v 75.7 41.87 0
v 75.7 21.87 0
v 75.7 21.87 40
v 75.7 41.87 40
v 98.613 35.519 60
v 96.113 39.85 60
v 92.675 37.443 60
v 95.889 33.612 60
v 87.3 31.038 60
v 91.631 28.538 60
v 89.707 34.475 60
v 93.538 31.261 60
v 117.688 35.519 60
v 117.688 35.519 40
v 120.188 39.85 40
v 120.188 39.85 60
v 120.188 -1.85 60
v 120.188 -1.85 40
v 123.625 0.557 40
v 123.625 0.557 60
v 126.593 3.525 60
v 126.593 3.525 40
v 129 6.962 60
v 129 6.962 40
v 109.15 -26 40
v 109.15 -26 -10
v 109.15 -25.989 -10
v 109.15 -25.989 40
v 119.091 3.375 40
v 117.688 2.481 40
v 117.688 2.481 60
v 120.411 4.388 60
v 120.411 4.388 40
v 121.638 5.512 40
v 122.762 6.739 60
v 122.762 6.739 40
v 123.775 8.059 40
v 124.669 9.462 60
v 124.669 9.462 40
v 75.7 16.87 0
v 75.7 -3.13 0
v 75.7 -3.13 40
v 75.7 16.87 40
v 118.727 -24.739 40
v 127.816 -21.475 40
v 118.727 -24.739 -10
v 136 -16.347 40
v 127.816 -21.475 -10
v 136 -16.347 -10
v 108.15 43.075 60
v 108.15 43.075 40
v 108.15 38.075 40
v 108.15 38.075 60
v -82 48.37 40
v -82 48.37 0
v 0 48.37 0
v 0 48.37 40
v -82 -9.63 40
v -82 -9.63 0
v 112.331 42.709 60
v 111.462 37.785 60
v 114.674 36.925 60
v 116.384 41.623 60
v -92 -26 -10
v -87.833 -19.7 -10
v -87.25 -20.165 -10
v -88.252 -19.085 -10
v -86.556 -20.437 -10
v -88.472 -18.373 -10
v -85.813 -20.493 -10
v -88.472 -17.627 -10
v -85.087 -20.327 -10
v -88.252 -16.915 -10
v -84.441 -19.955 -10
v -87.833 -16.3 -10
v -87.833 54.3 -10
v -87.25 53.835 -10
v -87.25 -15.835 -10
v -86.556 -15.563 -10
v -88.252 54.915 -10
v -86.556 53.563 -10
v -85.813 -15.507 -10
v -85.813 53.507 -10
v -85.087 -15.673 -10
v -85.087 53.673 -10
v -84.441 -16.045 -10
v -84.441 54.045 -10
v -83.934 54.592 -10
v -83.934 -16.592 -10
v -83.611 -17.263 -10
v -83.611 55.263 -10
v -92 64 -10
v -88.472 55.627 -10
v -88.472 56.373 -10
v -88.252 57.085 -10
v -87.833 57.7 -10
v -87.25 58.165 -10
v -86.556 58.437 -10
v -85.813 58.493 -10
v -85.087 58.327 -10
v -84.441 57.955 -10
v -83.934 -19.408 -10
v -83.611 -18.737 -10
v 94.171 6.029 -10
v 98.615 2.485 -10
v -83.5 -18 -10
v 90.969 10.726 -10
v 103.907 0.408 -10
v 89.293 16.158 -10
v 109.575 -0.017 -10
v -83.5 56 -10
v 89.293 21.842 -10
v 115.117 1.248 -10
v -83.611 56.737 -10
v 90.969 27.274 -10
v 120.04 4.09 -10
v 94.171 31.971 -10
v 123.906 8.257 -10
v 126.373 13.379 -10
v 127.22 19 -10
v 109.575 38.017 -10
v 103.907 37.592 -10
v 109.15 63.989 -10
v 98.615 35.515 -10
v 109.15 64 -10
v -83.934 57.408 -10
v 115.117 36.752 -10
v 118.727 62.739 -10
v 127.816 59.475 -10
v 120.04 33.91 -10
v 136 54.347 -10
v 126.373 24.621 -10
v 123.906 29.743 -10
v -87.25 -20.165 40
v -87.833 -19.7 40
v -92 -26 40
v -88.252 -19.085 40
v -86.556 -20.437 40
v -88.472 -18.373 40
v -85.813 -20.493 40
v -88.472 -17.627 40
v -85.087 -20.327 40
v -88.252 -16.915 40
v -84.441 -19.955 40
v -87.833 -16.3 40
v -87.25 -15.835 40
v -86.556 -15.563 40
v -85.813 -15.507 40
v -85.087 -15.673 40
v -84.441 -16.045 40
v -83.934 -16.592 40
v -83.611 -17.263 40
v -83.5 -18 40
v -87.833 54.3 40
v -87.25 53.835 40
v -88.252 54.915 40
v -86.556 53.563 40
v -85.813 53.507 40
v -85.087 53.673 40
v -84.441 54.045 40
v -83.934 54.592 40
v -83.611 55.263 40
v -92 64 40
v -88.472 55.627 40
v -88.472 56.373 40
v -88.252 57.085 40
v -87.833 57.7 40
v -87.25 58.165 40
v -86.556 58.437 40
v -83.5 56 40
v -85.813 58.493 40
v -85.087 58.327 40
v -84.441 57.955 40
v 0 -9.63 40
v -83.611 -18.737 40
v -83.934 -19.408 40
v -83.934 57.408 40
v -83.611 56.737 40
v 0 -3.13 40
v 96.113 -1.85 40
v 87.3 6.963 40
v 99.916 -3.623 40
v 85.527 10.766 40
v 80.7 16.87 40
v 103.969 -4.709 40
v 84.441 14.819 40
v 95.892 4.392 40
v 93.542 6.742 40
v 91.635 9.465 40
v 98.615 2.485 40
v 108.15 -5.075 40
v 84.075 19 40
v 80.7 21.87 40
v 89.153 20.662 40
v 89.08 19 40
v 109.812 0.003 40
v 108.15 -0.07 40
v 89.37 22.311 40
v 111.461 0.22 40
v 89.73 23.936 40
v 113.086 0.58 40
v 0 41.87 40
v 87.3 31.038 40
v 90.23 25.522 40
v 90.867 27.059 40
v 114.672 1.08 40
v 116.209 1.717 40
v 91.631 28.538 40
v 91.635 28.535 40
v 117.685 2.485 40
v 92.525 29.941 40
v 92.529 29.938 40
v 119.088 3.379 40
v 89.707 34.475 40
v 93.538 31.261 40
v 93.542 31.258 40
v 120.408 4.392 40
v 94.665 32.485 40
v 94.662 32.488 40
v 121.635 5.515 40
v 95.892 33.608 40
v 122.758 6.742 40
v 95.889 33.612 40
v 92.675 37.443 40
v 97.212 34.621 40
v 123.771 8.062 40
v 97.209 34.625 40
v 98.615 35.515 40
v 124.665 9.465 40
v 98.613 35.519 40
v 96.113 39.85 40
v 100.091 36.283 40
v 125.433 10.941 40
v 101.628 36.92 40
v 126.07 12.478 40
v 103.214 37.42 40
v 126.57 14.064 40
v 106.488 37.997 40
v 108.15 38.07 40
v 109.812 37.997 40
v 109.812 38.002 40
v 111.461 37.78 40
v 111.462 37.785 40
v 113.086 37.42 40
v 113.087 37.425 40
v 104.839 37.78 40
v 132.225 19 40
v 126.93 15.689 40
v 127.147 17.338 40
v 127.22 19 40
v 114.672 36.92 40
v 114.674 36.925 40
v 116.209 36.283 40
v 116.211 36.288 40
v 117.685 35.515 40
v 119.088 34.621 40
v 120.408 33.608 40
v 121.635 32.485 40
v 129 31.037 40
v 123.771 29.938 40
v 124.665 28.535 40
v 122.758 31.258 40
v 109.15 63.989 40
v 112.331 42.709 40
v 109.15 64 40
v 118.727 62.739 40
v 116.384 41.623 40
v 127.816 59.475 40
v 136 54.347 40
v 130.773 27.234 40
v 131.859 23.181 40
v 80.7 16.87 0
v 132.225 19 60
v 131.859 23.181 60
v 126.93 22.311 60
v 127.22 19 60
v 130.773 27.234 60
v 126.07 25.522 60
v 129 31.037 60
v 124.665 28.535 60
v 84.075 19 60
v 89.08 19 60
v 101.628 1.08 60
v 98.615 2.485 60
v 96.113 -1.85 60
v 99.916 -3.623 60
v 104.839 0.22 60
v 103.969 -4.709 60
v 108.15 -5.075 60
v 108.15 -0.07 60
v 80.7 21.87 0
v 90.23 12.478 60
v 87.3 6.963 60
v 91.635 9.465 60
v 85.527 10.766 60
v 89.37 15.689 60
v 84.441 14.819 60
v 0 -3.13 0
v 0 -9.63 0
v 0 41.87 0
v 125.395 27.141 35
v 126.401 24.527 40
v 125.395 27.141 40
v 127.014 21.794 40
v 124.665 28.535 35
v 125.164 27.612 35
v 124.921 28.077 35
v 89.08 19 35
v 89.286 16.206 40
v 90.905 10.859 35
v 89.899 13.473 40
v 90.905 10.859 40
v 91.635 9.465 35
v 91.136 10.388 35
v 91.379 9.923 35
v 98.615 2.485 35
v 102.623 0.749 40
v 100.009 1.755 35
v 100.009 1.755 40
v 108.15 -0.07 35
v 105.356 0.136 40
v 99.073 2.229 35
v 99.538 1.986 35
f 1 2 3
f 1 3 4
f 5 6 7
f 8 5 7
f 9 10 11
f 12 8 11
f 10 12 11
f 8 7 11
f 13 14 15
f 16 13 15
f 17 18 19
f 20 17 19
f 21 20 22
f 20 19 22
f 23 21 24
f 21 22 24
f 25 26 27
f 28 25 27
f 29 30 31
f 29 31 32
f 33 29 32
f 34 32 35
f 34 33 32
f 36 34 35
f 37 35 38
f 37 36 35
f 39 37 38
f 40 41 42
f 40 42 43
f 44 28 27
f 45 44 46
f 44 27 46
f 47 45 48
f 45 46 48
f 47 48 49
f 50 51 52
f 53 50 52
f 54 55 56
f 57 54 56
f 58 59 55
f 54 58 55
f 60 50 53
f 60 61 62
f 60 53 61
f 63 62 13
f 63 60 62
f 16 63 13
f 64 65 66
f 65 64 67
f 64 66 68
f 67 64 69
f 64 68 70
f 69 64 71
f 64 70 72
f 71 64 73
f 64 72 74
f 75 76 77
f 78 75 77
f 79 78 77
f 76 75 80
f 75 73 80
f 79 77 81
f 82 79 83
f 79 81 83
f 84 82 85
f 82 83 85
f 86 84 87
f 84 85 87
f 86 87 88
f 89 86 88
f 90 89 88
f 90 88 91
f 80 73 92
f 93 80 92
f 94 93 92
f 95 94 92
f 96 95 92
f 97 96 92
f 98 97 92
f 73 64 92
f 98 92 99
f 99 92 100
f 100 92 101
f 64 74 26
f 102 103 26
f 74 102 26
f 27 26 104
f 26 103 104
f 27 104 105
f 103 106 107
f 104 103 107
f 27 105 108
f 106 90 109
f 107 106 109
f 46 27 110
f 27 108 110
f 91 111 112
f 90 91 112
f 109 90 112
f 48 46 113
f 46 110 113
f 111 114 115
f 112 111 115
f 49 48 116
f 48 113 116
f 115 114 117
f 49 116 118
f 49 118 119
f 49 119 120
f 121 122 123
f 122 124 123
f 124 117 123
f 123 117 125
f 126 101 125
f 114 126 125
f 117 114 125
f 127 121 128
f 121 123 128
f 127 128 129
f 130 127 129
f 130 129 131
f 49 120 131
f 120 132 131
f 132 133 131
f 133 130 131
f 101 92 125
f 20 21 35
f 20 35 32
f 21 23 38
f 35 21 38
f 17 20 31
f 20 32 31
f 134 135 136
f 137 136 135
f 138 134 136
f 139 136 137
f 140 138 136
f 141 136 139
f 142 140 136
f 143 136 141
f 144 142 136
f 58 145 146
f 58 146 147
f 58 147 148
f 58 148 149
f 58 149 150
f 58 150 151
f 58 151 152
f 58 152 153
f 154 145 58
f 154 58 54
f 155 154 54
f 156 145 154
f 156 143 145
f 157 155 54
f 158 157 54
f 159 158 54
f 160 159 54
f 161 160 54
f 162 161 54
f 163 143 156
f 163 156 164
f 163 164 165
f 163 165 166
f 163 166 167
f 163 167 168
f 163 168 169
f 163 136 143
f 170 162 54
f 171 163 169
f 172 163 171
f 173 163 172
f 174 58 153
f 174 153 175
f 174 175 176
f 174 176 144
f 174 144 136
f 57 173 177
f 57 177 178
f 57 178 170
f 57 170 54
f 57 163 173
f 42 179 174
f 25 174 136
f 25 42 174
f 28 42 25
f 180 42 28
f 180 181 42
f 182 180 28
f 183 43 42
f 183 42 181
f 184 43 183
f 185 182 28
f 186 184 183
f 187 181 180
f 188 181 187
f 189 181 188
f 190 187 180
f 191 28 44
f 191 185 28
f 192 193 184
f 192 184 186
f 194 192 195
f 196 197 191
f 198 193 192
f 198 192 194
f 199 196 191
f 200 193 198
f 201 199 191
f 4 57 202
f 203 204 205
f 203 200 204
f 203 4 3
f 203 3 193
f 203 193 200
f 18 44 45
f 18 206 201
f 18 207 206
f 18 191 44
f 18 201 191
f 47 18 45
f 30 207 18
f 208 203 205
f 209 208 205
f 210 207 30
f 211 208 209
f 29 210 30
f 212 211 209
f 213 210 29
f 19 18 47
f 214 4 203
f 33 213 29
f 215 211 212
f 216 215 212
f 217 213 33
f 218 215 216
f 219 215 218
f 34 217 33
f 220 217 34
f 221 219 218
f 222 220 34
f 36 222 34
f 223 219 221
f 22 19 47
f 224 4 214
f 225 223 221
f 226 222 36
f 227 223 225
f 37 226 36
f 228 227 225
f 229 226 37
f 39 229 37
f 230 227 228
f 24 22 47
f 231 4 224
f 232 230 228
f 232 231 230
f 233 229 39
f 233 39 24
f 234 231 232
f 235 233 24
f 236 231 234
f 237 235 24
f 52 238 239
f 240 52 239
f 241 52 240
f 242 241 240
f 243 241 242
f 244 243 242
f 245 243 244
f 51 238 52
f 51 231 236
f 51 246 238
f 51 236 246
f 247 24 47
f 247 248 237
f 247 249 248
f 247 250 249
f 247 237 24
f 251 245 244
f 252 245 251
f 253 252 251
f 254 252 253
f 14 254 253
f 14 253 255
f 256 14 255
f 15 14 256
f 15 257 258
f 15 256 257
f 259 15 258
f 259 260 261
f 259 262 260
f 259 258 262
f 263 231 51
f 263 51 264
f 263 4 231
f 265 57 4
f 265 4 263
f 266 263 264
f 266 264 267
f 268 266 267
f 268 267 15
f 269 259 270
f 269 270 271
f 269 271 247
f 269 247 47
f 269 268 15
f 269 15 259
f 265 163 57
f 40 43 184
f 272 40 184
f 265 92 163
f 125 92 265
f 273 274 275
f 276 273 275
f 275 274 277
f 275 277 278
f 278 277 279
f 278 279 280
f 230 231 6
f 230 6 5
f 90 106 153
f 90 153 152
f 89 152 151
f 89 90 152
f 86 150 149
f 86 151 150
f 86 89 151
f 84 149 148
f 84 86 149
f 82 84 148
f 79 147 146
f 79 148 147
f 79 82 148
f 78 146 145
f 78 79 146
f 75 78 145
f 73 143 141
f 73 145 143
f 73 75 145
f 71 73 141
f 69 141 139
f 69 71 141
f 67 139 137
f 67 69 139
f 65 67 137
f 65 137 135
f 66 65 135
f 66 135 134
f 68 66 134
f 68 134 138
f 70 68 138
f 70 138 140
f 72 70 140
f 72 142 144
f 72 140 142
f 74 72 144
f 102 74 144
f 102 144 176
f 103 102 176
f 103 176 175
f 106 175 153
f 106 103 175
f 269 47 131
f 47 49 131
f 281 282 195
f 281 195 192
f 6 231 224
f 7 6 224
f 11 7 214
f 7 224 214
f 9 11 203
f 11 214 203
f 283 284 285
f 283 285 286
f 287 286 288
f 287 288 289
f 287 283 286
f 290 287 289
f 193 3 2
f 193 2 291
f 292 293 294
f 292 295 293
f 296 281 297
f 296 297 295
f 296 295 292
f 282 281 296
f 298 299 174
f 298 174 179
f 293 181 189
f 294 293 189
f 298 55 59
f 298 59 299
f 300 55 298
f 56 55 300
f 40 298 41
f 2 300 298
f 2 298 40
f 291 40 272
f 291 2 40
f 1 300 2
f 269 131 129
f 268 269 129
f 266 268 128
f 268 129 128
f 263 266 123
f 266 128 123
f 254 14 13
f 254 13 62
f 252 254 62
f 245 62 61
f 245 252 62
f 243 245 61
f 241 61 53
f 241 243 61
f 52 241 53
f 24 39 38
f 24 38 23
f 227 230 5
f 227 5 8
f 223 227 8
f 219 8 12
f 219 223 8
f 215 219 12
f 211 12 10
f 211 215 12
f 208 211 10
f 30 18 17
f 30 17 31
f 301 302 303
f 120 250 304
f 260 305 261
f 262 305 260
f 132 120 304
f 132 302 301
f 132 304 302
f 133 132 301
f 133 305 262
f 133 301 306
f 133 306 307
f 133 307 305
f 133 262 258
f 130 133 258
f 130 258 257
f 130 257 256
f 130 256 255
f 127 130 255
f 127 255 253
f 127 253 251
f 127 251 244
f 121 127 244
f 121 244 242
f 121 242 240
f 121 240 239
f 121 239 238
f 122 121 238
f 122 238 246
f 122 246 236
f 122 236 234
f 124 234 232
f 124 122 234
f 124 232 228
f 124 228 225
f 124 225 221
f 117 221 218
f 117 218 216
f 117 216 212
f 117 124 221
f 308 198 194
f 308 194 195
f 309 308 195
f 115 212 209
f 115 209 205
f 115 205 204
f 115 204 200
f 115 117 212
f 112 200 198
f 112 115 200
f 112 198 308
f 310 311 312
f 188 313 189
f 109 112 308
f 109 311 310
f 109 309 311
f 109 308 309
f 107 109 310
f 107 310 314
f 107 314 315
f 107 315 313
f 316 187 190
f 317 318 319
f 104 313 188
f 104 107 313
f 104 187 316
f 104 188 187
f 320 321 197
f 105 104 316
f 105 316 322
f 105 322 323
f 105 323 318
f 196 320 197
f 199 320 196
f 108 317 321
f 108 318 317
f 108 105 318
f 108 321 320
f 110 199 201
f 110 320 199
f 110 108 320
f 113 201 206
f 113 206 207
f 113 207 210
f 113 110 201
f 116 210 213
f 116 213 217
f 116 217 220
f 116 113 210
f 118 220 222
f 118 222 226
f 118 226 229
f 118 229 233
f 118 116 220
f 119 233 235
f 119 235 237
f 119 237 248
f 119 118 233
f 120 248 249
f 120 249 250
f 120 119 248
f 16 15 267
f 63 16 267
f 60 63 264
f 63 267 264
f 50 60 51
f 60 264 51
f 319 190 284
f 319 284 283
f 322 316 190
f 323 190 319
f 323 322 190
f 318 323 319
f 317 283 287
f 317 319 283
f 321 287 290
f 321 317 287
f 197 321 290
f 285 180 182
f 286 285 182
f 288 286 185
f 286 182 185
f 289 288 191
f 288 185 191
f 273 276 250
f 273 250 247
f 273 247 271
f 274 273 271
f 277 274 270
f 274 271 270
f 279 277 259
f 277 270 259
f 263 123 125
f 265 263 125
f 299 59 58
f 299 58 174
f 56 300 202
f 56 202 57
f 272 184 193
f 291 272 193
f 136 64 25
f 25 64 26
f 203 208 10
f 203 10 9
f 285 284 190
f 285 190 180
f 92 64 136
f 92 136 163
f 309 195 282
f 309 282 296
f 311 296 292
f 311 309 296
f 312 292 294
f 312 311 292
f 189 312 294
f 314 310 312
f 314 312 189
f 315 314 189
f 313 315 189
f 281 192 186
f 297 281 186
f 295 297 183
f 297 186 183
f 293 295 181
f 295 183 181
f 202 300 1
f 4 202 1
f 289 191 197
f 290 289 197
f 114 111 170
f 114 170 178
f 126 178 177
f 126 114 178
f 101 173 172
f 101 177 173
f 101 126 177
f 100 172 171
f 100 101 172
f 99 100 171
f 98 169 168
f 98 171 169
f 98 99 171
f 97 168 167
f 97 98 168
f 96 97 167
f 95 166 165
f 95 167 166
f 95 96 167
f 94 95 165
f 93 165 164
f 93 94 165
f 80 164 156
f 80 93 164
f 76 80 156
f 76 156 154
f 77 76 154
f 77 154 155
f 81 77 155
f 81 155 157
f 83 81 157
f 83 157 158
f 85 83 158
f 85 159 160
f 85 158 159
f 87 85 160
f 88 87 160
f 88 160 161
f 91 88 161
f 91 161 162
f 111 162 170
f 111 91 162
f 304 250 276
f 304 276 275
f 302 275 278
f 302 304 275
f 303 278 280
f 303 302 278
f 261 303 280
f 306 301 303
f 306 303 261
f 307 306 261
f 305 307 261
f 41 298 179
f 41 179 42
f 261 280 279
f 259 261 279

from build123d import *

# Parameters (mm, degrees)
CYLINDER_R        = 2.5
CYLINDER_DEPTH    = 70
CYLINDER001_R     = 2.5
CYLINDER001_DEPTH = 70
BOX004_W          = 68.15
BOX004_H          = 15
BOX004_DEPTH      = 50
BOX008_W          = 30
BOX008_H          = 100
BOX008_DEPTH      = 70
EXTRUDE003_DEPTH  = 25
BOX006_W          = 40
BOX006_H          = 120
BOX006_DEPTH      = 60
TUBE_R            = 45
TUBE_R_2          = 19.07
TUBE_DEPTH        = 50
BOX001_W          = 82
BOX001_H          = 58
BOX001_DEPTH      = 44.4
BOX007_W          = 5
BOX007_H          = 5
BOX007_DEPTH      = 44.4
SKETCH001_R       = 5
EXTRUDE001_DEPTH  = 4
EXTRUDE002_DEPTH  = 15
SKETCH_R          = 12.3
EXTRUDE_DEPTH     = 5
BOX_W             = 75.7
BOX_H             = 45
BOX_DEPTH         = 44.4
BOX002_W          = 175
BOX002_H          = 90
BOX002_DEPTH      = 50
BOX005_W          = 68.15
BOX005_H          = 15
BOX005_DEPTH      = 50


with BuildPart() as throughholecylinder2:
    # Cylinder → Cylinder (new body)
    with BuildSketch(Plane(origin=(-86, -18, -20), x_dir=(1, 0, 0), z_dir=(0, 0, 1))):
        Circle(CYLINDER_R)
    extrude(amount=CYLINDER_DEPTH)


with BuildPart() as throughholecylinder1:
    # Cylinder001 → Cylinder001 (new body)
    with BuildSketch(Plane(origin=(-86, 56, -20), x_dir=(1, 0, 0), z_dir=(0, 0, 1))):
        Circle(CYLINDER001_R)
    extrude(amount=CYLINDER001_DEPTH)


with BuildPart() as cube004:
    # Box004 → Box004 (new body)
    with BuildSketch(Plane(origin=(41, -26, -10), x_dir=(1, 0, 0), z_dir=(0, 0, 1))):
        with Locations((34.075, 7.5)):
            Rectangle(BOX004_W, BOX004_H)
    extrude(amount=BOX004_DEPTH)


with BuildPart() as steeringshaftcutter:
    # Box008 → Box008 (new body)
    with BuildSketch(Plane(origin=(136, -31, -14), x_dir=(1, 0, 0), z_dir=(0, 0, 1))):
        with Locations((15, 50)):
            Rectangle(BOX008_W, BOX008_H)
    extrude(amount=BOX008_DEPTH)


with BuildPart() as fingers:
    # Sketch004 (on Face2 of Tube) → Extrude003 (new body)
    with BuildSketch(Plane(origin=(120.15, 19, 40), x_dir=(1, 0, 0), z_dir=(0, 0, 1))):
        with BuildLine():
            Line((16.519435, -9.5375), (20.849562, -12.0375))
            ThreePointArc((12.0375, -20.849562), (17.023596, -17.023596), (20.849562, -12.0375))
            Line((12.0375, -20.849562), (9.5375, -16.519435))
            ThreePointArc((9.5375, -16.519435), (13.488062, -13.488062), (16.519435, -9.5375))
        make_face()
        with BuildLine():
            Line((0, -24.075), (0, -19.07))
            ThreePointArc((-9.535, -16.515104), (-4.935679, -18.420206), (0, -19.07))
            Line((-9.535, -16.515104), (-12.0375, -20.849562))
            ThreePointArc((-12.0375, -20.849562), (-6.231069, -23.254664), (0, -24.075))
        make_face()
        with BuildLine():
            Line((-20.849562, -12.0375), (-16.515104, -9.535))
            ThreePointArc((-19.07, 0), (-18.420206, -4.935679), (-16.515104, -9.535))
            Line((-19.07, 0), (-24.075, 0))
            ThreePointArc((-24.075, 0), (-23.254664, -6.231069), (-20.849562, -12.0375))
        make_face()
        with BuildLine():
            Line((-16.519435, 9.5375), (-20.849562, 12.0375))
            ThreePointArc((-12.0375, 20.849562), (-17.023596, 17.023596), (-20.849562, 12.0375))
            Line((-12.0375, 20.849562), (-9.5375, 16.519435))
            ThreePointArc((-9.5375, 16.519435), (-13.488062, 13.488062), (-16.519435, 9.5375))
        make_face()
        with BuildLine():
            Line((0, 24.075), (0, 19.075))
            ThreePointArc((9.5375, 16.519435), (4.936973, 18.425035), (0, 19.075))
            Line((9.5375, 16.519435), (12.0375, 20.849562))
            ThreePointArc((12.0375, 20.849562), (6.231069, 23.254664), (0, 24.075))
        make_face()
        with BuildLine():
            Line((16.515104, 9.535), (20.849562, 12.0375))
            ThreePointArc((24.075, 0), (23.254664, 6.231069), (20.849562, 12.0375))
            Line((19.07, 0), (24.075, 0))
            ThreePointArc((19.07, 0), (18.420206, 4.935679), (16.515104, 9.535))
        make_face()
    extrude(amount=EXTRUDE003_DEPTH)


with BuildPart() as fingers_1:
    # Extrude003 placement: moved
    add(fingers.part.moved(Location((0, 0, -5))))


with BuildPart() as roundoff:
    # Box006 → Box006 (new body)
    with BuildSketch(Plane(origin=(55, -34, -17), x_dir=(1, 0, 0), z_dir=(0, 0, 1))):
        with Locations((20, 60)):
            Rectangle(BOX006_W, BOX006_H)
    extrude(amount=BOX006_DEPTH)


with BuildPart() as steeringshaftcutdown:
    # Tube → Tube (new body)
    with BuildSketch(Plane(origin=(120.15, 19, -10), x_dir=(1, 0, 0), z_dir=(0, 0, 1))):
        Circle(TUBE_R)
        Circle(TUBE_R_2, mode=Mode.SUBTRACT)
    extrude(amount=TUBE_DEPTH)

    # Cut001: cut RoundOff
    add(roundoff.part, mode=Mode.SUBTRACT)

    # Fusion004: union Fingers
    add(fingers_1.part)


with BuildPart() as steeringshaftcutdown_1:
    # Fusion004 placement: moved
    add(steeringshaftcutdown.part.moved(Location((-12, 0, 0))))

    # Cut002: cut SteeringShaftCutter
    add(steeringshaftcutter.part, mode=Mode.SUBTRACT)


with BuildPart() as motorhead:
    # Box001 → Box001 (new body)
    with BuildSketch(Plane(origin=(-82, -9.63, 0), x_dir=(1, 0, 0), z_dir=(0, 0, 1))):
        with Locations((41, 29)):
            Rectangle(BOX001_W, BOX001_H)
    extrude(amount=BOX001_DEPTH)


with BuildPart() as nubchannel:
    # Box007 → Box007 (new body)
    with BuildSketch(Plane(origin=(75.7, 16.87, 0), x_dir=(1, 0, 0), z_dir=(0, 0, 1))):
        with Locations((2.5, 2.5)):
            Rectangle(BOX007_W, BOX007_H)
    extrude(amount=BOX007_DEPTH)


with BuildPart() as motorshaftfull:
    # Sketch001 (on Face3 of Extrude) → Extrude001 (new body)
    with BuildSketch(Plane.XY.offset(49.4)):
        with Locations((-58.7, 20.37)):
            Circle(SKETCH001_R)
    extrude(amount=EXTRUDE001_DEPTH)


with BuildPart() as motorshaftd:
    # Sketch002 (on Face3 of Extrude001) → Extrude002 (new body)
    with BuildSketch(Plane.XY.offset(53.4)):
        with BuildLine():
            Line((-62.7, 23.37), (-62.7, 17.37))
            ThreePointArc((-62.7, 17.37), (-53.7, 20.37), (-62.7, 23.37))
        make_face()
    extrude(amount=EXTRUDE002_DEPTH)


with BuildPart() as motorshaftassembly:
    # Sketch (on Face6 of Box001) → Extrude (new body)
    with BuildSketch(Plane(origin=(-82, -9.63, 44.4), x_dir=(1, 0, 0), z_dir=(0, 0, 1))):
        with Locations((23.3, 30)):
            Circle(SKETCH_R)
    extrude(amount=EXTRUDE_DEPTH)

    # Fusion: union MotorShaftFull, MotorShaftD
    add(motorshaftfull.part)
    add(motorshaftd.part)


with BuildPart() as motor:
    # Box → Box (new body)
    with BuildSketch(Plane(origin=(0, -3.13, 0), x_dir=(1, 0, 0), z_dir=(0, 0, 1))):
        with Locations((37.85, 22.5)):
            Rectangle(BOX_W, BOX_H)
    extrude(amount=BOX_DEPTH)

    # Fusion005: union MotorHead, NubChannel, MotorShaftAssembly
    add(motorhead.part)
    add(nubchannel.part)
    add(motorshaftassembly.part)


with BuildPart() as steeringshaftmotormount:
    # Box002 → Box002 (new body)
    with BuildSketch(Plane(origin=(-92, -26, -10), x_dir=(1, 0, 0), z_dir=(0, 0, 1))):
        with Locations((87.5, 45)):
            Rectangle(BOX002_W, BOX002_H)
    extrude(amount=BOX002_DEPTH)

    # Cut: cut Motor
    add(motor.part, mode=Mode.SUBTRACT)

    # Fusion006: union SteeringShaftCutDown
    add(steeringshaftcutdown_1.part)


with BuildPart() as cut004:
    # Box005 → Box005 (new body)
    with BuildSketch(Plane(origin=(41, 49, -10), x_dir=(1, 0, 0), z_dir=(0, 0, 1))):
        with Locations((34.075, 7.5)):
            Rectangle(BOX005_W, BOX005_H)
    extrude(amount=BOX005_DEPTH)

    # Fusion007: union Cube004, SteeringShaftMotorMount
    add(cube004.part)
    add(steeringshaftmotormount.part)

    # Cut003: cut ThroughHoleCylinder1
    add(throughholecylinder1.part, mode=Mode.SUBTRACT)

    # Cut004: cut ThroughHoleCylinder2
    add(throughholecylinder2.part, mode=Mode.SUBTRACT)


solid = cut004.part
